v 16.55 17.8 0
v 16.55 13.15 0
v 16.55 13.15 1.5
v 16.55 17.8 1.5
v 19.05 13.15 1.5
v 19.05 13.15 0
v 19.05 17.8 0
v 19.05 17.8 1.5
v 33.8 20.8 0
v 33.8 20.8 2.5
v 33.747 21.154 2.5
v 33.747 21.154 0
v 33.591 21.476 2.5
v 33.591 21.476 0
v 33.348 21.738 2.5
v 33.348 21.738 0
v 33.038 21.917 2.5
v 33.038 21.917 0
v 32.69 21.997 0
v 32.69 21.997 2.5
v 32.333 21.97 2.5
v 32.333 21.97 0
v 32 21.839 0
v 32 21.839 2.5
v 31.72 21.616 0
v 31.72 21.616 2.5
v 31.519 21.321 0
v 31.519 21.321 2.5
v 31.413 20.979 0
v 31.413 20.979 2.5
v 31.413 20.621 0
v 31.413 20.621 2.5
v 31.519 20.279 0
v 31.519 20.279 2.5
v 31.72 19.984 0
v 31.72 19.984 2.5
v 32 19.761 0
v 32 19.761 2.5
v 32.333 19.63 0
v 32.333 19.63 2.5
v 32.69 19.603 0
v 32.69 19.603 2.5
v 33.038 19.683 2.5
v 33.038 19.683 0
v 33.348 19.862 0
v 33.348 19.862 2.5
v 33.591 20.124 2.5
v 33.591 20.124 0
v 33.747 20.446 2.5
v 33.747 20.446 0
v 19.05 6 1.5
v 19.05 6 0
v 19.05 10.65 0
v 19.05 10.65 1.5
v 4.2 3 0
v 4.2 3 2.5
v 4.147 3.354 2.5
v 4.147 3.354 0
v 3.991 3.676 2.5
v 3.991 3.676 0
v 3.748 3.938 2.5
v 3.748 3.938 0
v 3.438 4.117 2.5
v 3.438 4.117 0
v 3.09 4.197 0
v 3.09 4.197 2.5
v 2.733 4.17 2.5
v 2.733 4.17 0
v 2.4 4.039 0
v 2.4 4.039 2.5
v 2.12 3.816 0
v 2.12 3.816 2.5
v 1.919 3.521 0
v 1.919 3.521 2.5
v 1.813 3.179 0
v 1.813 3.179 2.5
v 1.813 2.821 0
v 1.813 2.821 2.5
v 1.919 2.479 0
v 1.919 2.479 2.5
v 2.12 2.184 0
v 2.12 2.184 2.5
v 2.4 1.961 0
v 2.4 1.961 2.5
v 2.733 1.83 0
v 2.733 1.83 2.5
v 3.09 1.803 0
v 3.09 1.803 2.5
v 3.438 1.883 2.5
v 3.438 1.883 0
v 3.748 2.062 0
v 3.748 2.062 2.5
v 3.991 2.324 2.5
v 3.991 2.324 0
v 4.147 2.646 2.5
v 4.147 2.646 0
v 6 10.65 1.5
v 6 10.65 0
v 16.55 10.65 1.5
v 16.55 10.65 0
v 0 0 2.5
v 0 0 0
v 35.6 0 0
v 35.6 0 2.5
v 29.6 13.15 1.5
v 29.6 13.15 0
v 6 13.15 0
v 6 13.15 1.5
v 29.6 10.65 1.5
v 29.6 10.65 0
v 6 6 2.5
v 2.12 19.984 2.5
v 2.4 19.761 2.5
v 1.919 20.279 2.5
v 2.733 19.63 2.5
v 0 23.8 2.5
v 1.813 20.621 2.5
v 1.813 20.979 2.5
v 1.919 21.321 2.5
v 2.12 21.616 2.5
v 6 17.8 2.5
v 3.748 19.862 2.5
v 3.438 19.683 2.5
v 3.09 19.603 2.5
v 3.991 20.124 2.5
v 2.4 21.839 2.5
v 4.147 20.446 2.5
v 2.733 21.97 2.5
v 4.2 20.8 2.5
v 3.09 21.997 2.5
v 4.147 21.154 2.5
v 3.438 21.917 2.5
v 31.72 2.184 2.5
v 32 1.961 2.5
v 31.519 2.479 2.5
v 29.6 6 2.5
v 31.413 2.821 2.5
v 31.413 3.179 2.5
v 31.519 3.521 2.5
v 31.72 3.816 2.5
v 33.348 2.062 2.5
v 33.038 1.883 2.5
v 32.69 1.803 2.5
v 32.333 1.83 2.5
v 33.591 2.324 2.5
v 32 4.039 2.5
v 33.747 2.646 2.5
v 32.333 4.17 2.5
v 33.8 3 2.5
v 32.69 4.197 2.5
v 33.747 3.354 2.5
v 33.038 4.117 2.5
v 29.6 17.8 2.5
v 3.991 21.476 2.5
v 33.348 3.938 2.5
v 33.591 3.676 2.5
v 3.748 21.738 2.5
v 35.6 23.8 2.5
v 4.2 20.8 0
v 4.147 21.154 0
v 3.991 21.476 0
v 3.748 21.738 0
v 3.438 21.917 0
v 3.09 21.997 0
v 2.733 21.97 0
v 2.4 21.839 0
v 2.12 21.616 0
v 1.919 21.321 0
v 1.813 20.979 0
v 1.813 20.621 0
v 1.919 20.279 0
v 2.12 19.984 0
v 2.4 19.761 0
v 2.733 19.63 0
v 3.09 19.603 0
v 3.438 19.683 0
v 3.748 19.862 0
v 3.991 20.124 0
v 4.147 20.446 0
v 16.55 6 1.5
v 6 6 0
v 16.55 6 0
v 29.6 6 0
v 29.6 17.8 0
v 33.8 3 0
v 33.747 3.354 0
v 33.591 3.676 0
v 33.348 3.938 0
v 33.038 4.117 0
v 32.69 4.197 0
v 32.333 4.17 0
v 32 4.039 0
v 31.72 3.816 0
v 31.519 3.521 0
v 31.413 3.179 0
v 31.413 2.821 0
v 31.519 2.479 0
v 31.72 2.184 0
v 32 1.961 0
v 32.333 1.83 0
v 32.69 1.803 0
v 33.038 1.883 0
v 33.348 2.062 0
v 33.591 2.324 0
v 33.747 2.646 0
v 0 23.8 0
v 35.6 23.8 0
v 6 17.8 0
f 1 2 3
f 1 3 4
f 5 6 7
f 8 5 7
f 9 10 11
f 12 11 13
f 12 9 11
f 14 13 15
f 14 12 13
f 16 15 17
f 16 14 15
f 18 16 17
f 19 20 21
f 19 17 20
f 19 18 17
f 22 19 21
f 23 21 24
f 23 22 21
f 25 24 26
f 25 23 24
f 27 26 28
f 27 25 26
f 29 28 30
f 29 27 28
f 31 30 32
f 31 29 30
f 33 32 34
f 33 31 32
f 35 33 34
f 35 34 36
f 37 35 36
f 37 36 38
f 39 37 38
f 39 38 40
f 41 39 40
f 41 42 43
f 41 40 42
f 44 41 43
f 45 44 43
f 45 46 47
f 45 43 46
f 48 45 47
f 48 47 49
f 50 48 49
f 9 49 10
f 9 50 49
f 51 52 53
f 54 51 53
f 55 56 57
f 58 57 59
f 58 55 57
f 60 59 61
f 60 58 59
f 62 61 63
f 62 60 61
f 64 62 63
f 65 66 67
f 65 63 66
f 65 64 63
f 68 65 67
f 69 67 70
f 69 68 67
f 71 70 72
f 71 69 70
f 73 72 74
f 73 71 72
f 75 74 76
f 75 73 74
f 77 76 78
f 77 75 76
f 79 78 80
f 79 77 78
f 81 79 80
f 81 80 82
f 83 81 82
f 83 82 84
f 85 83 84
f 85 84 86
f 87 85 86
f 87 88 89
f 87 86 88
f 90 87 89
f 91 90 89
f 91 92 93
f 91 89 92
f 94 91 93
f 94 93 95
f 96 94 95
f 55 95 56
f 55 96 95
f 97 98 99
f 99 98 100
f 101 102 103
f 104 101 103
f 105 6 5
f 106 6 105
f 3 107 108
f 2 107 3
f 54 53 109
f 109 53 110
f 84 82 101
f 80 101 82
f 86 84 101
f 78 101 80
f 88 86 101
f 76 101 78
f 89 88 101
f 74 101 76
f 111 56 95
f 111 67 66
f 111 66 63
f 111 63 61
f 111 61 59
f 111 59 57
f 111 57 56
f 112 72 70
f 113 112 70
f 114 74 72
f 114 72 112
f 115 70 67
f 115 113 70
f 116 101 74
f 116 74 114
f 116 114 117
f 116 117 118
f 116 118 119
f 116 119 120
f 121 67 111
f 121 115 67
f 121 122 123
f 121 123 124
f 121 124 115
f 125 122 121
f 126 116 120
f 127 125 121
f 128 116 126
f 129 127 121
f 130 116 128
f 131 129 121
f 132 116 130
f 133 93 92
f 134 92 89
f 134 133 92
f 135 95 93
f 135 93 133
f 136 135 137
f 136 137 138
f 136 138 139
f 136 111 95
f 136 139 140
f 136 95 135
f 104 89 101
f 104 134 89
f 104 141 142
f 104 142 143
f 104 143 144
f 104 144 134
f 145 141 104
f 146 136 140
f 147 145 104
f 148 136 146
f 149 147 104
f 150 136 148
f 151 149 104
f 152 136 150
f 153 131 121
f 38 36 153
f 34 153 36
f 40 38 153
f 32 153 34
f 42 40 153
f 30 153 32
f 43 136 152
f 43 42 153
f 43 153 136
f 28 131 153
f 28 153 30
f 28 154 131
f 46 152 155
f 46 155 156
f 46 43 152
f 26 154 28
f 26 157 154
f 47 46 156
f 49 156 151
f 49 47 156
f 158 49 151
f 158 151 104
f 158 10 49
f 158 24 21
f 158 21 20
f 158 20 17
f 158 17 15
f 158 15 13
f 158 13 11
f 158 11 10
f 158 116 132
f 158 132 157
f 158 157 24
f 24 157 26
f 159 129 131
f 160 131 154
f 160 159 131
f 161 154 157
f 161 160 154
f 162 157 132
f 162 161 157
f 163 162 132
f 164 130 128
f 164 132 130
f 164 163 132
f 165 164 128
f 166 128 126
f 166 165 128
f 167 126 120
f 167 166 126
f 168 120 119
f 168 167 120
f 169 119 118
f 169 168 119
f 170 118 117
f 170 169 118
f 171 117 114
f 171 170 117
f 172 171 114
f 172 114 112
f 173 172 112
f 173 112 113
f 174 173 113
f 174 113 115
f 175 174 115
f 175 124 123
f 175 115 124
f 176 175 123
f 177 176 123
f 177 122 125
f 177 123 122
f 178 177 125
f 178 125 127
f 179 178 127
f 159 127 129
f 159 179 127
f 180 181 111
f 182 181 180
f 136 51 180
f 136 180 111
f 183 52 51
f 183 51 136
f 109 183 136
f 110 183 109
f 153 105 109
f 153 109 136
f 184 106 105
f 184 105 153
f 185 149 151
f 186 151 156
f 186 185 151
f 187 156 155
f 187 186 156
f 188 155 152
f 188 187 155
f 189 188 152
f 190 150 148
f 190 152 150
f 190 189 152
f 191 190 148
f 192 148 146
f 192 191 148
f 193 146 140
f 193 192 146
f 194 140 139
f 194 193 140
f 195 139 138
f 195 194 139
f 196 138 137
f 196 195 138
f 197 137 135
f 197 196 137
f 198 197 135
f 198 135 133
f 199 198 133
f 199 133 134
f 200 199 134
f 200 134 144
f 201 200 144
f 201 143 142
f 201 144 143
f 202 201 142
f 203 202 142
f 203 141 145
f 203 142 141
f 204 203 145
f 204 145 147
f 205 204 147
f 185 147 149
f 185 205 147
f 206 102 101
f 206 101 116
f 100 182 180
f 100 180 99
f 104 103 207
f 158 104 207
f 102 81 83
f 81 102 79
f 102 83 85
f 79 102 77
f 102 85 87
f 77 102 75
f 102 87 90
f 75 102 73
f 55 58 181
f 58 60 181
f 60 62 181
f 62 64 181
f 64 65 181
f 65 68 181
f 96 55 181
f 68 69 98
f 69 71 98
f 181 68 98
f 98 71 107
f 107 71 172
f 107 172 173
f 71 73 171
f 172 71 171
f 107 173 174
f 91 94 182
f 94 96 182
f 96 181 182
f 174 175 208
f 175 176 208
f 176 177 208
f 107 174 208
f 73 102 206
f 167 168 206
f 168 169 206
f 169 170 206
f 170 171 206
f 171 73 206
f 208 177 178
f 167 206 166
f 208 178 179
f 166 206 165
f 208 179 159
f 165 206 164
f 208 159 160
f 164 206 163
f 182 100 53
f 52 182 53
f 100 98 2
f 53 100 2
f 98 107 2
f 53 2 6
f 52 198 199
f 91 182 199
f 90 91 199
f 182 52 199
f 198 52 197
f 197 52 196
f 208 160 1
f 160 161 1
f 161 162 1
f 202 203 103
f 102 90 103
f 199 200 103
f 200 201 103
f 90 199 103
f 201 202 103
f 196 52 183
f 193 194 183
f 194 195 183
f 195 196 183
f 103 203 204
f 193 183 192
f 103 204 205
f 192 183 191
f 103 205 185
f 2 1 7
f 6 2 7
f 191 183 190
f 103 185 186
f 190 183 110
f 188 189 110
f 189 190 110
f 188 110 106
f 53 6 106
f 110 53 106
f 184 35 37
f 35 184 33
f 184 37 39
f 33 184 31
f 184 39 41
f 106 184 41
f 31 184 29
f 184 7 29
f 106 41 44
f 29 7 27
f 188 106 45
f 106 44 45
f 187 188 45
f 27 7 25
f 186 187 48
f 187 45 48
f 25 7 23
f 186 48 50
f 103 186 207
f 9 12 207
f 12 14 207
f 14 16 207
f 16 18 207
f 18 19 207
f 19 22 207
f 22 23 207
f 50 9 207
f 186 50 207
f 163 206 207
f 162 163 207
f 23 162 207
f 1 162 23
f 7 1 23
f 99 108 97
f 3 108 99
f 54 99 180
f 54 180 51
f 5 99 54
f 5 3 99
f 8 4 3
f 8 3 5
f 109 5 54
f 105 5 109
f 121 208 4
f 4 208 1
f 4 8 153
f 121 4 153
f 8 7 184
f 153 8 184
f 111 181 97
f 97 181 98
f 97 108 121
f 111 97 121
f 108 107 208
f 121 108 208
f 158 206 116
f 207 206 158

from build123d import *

# Parameters (mm, degrees)
CYLINDER_R       = 1.2
CYLINDER_DEPTH   = 10
ARRAY001_X_COUNT = 2
ARRAY001_X_PITCH = 29.6
ARRAY001_Y_COUNT = 2
ARRAY001_Y_PITCH = 17.8
BOX003_W         = 23.6
BOX003_H         = 11.8
BOX003_DEPTH     = 10
BOX002_W         = 35.6
BOX002_H         = 23.8
BOX002_DEPTH     = 2.5
BOX017_W         = 2.5
BOX017_H         = 23.8
BOX017_DEPTH     = 1.5
BOX005_W         = 35.6
BOX005_H         = 2.5
BOX005_DEPTH     = 1.5


with BuildPart() as bolt_hole_array_clone:
    # Cylinder → Cylinder (new body)
    with BuildSketch(Plane.XY):
        Circle(CYLINDER_R)
    extrude(amount=CYLINDER_DEPTH)

    # Array001 X: bolt hole array clone ×2


with BuildPart() as bolt_hole_array_clone_1:
    add(bolt_hole_array_clone.part)
    with Locations(*[(i * ARRAY001_X_PITCH, 0, 0) for i in range(1, ARRAY001_X_COUNT)]):
        add(bolt_hole_array_clone.part)

    # Array001 Y: bolt hole array clone ×2


with BuildPart() as bolt_hole_array_clone_2:
    add(bolt_hole_array_clone_1.part)
    with Locations(*[(0, i * ARRAY001_Y_PITCH, 0) for i in range(1, ARRAY001_Y_COUNT)]):
        add(bolt_hole_array_clone_1.part)


with BuildPart() as bolt_hole_array_clone_3:
    # Array001 placement: moved
    add(bolt_hole_array_clone_2.part.moved(Location((3, 3, 0))))


with BuildPart() as mesh_extraction_fusion:
    # Box003 → Box003 (new body)
    with BuildSketch(Plane(origin=(6, 6, 0), x_dir=(1, 0, 0), z_dir=(0, 0, 1))):
        with Locations((11.8, 5.9)):
            Rectangle(BOX003_W, BOX003_H)
    extrude(amount=BOX003_DEPTH)

    # Fusion003: union bolt hole array clone
    add(bolt_hole_array_clone_3.part)


with BuildPart() as mesh_border_cut:
    # Box002 → Box002 (new body)
    with BuildSketch(Plane.XY):
        with Locations((17.8, 11.9)):
            Rectangle(BOX002_W, BOX002_H)
    extrude(amount=BOX002_DEPTH)

    # Cut001: cut mesh extraction fusion
    add(mesh_extraction_fusion.part, mode=Mode.SUBTRACT)


with BuildPart() as y_btn_holder_array001:
    # Box017 → Box017 (new body)
    with BuildSketch(Plane.XY):
        with Locations((1.25, 11.9)):
            Rectangle(BOX017_W, BOX017_H)
    extrude(amount=BOX017_DEPTH)


with BuildPart() as y_btn_holder_array001_1:
    # Array011 placement: moved
    add(y_btn_holder_array001.part.moved(Location((16.55, 0, 0))))


with BuildPart() as x_mesh_holder_fusion:
    # Box005 → Box005 (new body)
    with BuildSketch(Plane.XY):
        with Locations((17.8, 1.25)):
            Rectangle(BOX005_W, BOX005_H)
    extrude(amount=BOX005_DEPTH)


with BuildPart() as x_mesh_holder_fusion_1:
    # Array002 placement: moved
    add(x_mesh_holder_fusion.part.moved(Location((0, 10.65, 0))))

    # Fusion001: union mesh border cut, y btn holder array001
    add(mesh_border_cut.part)
    add(y_btn_holder_array001_1.part)


solid = x_mesh_holder_fusion_1.part
